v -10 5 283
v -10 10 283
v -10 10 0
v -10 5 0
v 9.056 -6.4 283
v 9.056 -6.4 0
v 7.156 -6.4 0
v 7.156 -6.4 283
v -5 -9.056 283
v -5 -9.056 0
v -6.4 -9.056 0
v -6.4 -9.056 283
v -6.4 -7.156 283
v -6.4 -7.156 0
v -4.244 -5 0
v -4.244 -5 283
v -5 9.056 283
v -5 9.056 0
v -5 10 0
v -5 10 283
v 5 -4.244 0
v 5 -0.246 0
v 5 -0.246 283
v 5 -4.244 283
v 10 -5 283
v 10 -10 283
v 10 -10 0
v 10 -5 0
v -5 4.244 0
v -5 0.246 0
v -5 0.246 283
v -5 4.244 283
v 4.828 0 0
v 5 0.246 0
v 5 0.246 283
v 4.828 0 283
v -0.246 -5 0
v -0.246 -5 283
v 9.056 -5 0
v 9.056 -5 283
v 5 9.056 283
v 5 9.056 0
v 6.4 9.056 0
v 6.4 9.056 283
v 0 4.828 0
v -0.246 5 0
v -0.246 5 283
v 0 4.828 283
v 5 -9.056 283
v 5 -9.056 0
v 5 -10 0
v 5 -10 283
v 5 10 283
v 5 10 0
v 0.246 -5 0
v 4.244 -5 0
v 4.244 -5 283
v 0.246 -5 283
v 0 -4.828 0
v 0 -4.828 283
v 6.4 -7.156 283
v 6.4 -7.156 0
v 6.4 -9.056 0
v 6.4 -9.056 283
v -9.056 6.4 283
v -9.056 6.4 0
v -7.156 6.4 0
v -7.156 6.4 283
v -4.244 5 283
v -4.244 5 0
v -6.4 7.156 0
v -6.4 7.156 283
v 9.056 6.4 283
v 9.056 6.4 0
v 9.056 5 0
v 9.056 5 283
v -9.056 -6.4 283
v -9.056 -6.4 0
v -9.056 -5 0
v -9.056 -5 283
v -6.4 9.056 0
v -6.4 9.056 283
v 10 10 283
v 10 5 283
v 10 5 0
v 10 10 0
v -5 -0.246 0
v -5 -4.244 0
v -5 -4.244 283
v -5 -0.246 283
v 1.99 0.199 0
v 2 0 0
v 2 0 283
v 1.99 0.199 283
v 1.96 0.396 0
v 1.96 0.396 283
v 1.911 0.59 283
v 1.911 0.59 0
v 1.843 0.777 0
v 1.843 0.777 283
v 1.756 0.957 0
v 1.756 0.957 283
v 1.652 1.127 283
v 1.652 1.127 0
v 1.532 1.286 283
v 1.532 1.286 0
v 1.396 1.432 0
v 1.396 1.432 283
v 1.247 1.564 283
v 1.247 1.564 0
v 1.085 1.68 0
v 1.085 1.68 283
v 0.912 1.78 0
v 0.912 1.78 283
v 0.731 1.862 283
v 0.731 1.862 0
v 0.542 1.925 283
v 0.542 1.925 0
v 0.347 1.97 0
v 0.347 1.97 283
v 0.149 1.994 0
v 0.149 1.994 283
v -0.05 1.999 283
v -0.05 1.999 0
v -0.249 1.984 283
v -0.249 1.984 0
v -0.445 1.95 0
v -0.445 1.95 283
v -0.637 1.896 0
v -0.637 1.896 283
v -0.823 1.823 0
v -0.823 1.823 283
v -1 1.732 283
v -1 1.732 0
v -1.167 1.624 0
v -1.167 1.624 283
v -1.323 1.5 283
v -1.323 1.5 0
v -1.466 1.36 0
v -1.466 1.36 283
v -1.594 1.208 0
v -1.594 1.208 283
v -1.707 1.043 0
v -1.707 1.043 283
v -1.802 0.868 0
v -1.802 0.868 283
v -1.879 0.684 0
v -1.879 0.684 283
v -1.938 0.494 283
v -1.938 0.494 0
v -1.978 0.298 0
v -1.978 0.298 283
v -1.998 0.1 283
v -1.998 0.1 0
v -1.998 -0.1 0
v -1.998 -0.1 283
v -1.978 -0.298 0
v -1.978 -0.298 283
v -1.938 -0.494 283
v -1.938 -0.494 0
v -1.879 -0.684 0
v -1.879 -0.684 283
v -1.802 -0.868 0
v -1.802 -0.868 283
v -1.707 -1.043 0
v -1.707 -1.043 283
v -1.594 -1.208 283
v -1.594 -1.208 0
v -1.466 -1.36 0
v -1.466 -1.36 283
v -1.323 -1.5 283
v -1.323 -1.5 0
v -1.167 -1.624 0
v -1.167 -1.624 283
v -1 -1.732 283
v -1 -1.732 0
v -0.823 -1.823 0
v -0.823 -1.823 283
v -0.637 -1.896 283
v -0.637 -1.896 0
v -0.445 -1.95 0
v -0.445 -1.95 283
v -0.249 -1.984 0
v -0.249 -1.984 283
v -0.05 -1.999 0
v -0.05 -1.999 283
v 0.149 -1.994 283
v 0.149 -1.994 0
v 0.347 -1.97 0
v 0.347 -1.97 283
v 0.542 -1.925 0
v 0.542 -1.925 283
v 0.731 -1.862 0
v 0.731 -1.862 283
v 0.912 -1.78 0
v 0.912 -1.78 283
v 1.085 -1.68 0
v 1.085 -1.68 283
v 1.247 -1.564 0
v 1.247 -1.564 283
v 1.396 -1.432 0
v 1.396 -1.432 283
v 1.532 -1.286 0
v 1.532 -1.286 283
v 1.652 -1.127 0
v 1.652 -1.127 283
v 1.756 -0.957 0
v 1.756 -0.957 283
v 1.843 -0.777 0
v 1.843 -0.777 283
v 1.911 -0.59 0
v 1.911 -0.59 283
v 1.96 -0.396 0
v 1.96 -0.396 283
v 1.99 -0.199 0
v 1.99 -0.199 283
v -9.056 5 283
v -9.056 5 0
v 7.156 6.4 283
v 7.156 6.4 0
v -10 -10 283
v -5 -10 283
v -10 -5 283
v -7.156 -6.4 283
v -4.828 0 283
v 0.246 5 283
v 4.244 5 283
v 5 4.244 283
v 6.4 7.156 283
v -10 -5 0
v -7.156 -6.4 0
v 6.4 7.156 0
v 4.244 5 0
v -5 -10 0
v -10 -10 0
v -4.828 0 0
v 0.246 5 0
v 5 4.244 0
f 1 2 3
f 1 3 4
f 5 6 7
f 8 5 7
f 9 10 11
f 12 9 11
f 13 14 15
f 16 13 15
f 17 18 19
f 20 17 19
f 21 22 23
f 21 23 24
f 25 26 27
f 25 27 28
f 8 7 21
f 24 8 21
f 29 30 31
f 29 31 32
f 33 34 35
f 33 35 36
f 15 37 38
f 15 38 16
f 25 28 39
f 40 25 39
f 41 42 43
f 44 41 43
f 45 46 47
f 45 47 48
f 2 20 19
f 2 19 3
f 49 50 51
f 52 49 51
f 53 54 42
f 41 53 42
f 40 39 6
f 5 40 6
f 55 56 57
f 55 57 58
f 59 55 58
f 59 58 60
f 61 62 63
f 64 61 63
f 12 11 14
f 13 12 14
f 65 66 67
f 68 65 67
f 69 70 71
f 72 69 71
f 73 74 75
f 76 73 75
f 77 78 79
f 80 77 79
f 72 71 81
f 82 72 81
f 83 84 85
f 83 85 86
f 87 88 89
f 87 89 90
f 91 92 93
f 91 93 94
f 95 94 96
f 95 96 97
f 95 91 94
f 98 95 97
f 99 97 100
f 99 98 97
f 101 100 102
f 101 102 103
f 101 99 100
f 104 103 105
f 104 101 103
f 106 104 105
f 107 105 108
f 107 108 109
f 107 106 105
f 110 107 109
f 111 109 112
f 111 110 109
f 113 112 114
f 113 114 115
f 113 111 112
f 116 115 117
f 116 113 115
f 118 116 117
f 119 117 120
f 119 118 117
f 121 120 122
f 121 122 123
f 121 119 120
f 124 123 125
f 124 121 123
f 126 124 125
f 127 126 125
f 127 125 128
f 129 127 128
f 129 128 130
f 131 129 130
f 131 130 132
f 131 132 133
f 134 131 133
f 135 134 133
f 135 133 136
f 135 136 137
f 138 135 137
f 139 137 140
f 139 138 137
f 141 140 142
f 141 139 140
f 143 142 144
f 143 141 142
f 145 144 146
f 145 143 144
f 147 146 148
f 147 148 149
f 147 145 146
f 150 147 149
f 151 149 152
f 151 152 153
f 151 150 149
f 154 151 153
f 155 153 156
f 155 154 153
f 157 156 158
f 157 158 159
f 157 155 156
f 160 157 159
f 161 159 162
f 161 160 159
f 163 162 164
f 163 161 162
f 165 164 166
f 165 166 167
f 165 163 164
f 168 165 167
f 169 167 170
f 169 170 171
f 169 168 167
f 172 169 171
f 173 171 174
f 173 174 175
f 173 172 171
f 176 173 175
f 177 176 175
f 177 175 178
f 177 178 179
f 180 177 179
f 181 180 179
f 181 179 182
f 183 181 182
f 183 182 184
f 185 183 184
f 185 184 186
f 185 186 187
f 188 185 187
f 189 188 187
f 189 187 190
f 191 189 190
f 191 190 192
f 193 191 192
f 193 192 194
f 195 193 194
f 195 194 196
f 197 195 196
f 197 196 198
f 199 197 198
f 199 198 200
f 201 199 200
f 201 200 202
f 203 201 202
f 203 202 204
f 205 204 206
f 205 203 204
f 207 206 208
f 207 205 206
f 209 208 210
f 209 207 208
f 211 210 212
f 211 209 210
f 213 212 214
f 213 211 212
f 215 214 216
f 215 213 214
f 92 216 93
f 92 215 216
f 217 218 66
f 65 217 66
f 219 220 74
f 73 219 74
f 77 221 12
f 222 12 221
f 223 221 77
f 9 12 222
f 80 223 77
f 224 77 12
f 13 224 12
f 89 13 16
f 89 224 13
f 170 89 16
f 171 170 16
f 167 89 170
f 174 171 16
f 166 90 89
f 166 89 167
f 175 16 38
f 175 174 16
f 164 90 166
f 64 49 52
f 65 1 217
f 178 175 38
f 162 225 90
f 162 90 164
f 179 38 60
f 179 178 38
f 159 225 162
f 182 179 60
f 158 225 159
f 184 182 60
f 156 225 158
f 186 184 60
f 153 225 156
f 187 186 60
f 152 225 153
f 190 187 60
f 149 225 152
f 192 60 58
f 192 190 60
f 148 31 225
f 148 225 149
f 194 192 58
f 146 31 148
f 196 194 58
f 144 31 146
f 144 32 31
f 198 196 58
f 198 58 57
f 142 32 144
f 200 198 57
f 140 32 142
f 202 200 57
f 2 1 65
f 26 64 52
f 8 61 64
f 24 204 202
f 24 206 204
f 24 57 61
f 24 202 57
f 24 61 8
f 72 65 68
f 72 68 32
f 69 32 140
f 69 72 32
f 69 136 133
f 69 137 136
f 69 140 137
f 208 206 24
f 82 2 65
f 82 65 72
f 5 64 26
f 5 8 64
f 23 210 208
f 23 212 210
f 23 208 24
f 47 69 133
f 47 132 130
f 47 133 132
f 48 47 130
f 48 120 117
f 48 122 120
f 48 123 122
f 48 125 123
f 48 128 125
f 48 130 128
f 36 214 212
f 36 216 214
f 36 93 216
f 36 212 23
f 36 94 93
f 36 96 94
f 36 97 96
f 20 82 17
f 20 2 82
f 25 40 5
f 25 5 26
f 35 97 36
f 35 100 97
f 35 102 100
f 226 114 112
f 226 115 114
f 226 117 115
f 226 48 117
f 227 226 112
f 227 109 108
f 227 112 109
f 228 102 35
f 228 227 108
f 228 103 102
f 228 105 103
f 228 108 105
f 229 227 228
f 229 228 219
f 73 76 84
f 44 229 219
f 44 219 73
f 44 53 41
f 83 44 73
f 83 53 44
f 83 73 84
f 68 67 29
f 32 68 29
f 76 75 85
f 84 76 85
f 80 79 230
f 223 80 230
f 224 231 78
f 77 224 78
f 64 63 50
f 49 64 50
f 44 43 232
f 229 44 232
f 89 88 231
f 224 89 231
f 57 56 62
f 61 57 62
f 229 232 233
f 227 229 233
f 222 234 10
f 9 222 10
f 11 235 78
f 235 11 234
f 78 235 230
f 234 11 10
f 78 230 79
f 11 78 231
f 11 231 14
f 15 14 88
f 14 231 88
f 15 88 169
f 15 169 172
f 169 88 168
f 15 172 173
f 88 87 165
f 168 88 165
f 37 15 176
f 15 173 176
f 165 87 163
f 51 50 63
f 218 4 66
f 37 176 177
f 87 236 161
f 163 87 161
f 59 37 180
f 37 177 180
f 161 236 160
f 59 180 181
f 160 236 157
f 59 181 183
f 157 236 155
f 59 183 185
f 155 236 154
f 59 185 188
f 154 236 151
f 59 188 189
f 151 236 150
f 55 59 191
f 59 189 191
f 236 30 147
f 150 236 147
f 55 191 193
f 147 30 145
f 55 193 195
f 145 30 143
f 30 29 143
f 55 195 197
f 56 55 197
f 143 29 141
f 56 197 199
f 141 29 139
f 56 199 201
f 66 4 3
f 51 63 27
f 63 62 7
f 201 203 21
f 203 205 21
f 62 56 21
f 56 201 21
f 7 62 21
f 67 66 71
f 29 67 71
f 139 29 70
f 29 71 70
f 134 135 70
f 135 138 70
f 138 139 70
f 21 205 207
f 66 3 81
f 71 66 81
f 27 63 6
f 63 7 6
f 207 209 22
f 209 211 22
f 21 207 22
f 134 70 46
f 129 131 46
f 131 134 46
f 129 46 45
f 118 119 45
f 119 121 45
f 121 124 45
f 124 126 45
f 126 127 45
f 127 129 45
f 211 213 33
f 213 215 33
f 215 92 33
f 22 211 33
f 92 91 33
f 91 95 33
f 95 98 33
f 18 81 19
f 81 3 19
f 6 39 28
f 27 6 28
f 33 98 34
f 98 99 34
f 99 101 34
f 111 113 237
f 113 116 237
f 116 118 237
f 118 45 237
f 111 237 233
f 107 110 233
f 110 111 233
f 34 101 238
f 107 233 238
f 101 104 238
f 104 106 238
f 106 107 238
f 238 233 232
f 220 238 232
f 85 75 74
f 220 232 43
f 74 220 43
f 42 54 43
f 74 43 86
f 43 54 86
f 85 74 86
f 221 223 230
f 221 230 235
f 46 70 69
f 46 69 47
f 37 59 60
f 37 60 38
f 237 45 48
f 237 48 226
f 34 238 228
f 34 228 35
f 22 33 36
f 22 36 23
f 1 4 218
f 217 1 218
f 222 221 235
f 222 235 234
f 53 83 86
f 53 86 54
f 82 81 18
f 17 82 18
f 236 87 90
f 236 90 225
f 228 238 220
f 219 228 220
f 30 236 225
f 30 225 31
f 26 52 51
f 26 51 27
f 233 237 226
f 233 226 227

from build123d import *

# Parameters (mm, degrees)
SKETCH1_R           = 2
BOSS_EXTRUDE1_DEPTH = 283


with BuildPart() as part:
    # Sketch1 → Boss-Extrude1 (new body)
    with BuildSketch(Plane.XY):
        Polygon((6.4, 7.156263811), (4.243736189, 5), (5, 5), (5, 4.243736189), (7.156263811, 6.4), (9.056263811, 6.4), (9.056263811, 5), (10, 5), (10, 10), (5, 10), (5, 9.056263811), (6.4, 9.056263811), align=None)
        Polygon((-5, 0.245745613), (-5, 5), (-0.245745613, 5), (0, 4.827927069), (0.245745613, 5), (5, 5), (5, 0.245745613), (4.827927069, 0), (5, -0.245745613), (5, -5), (0.245745613, -5), (0, -4.827927069), (-0.245745613, -5), (-5, -5), (-5, -0.245745613), (-4.827927069, 0), align=None)
        Circle(SKETCH1_R, mode=Mode.SUBTRACT)
        Polygon((-10, 10), (-10, 5), (-9.056263811, 5), (-9.056263811, 6.4), (-7.156263811, 6.4), (-5, 4.243736189), (-5, 5), (-4.243736189, 5), (-6.4, 7.156263811), (-6.4, 9.056263811), (-5, 9.056263811), (-5, 10), align=None)
        Polygon((-5, -5), (-5, -4.243736189), (-7.156263811, -6.4), (-9.056263811, -6.4), (-9.056263811, -5), (-10, -5), (-10, -10), (-5, -10), (-5, -9.056263811), (-6.4, -9.056263811), (-6.4, -7.156263811), (-4.243736189, -5), align=None)
        Polygon((5, -5), (4.243736189, -5), (6.4, -7.156263811), (6.4, -9.056263811), (5, -9.056263811), (5, -10), (10, -10), (10, -5), (9.056263811, -5), (9.056263811, -6.4), (7.156263811, -6.4), (5, -4.243736189), align=None)
    extrude(amount=BOSS_EXTRUDE1_DEPTH)


solid = part.part
